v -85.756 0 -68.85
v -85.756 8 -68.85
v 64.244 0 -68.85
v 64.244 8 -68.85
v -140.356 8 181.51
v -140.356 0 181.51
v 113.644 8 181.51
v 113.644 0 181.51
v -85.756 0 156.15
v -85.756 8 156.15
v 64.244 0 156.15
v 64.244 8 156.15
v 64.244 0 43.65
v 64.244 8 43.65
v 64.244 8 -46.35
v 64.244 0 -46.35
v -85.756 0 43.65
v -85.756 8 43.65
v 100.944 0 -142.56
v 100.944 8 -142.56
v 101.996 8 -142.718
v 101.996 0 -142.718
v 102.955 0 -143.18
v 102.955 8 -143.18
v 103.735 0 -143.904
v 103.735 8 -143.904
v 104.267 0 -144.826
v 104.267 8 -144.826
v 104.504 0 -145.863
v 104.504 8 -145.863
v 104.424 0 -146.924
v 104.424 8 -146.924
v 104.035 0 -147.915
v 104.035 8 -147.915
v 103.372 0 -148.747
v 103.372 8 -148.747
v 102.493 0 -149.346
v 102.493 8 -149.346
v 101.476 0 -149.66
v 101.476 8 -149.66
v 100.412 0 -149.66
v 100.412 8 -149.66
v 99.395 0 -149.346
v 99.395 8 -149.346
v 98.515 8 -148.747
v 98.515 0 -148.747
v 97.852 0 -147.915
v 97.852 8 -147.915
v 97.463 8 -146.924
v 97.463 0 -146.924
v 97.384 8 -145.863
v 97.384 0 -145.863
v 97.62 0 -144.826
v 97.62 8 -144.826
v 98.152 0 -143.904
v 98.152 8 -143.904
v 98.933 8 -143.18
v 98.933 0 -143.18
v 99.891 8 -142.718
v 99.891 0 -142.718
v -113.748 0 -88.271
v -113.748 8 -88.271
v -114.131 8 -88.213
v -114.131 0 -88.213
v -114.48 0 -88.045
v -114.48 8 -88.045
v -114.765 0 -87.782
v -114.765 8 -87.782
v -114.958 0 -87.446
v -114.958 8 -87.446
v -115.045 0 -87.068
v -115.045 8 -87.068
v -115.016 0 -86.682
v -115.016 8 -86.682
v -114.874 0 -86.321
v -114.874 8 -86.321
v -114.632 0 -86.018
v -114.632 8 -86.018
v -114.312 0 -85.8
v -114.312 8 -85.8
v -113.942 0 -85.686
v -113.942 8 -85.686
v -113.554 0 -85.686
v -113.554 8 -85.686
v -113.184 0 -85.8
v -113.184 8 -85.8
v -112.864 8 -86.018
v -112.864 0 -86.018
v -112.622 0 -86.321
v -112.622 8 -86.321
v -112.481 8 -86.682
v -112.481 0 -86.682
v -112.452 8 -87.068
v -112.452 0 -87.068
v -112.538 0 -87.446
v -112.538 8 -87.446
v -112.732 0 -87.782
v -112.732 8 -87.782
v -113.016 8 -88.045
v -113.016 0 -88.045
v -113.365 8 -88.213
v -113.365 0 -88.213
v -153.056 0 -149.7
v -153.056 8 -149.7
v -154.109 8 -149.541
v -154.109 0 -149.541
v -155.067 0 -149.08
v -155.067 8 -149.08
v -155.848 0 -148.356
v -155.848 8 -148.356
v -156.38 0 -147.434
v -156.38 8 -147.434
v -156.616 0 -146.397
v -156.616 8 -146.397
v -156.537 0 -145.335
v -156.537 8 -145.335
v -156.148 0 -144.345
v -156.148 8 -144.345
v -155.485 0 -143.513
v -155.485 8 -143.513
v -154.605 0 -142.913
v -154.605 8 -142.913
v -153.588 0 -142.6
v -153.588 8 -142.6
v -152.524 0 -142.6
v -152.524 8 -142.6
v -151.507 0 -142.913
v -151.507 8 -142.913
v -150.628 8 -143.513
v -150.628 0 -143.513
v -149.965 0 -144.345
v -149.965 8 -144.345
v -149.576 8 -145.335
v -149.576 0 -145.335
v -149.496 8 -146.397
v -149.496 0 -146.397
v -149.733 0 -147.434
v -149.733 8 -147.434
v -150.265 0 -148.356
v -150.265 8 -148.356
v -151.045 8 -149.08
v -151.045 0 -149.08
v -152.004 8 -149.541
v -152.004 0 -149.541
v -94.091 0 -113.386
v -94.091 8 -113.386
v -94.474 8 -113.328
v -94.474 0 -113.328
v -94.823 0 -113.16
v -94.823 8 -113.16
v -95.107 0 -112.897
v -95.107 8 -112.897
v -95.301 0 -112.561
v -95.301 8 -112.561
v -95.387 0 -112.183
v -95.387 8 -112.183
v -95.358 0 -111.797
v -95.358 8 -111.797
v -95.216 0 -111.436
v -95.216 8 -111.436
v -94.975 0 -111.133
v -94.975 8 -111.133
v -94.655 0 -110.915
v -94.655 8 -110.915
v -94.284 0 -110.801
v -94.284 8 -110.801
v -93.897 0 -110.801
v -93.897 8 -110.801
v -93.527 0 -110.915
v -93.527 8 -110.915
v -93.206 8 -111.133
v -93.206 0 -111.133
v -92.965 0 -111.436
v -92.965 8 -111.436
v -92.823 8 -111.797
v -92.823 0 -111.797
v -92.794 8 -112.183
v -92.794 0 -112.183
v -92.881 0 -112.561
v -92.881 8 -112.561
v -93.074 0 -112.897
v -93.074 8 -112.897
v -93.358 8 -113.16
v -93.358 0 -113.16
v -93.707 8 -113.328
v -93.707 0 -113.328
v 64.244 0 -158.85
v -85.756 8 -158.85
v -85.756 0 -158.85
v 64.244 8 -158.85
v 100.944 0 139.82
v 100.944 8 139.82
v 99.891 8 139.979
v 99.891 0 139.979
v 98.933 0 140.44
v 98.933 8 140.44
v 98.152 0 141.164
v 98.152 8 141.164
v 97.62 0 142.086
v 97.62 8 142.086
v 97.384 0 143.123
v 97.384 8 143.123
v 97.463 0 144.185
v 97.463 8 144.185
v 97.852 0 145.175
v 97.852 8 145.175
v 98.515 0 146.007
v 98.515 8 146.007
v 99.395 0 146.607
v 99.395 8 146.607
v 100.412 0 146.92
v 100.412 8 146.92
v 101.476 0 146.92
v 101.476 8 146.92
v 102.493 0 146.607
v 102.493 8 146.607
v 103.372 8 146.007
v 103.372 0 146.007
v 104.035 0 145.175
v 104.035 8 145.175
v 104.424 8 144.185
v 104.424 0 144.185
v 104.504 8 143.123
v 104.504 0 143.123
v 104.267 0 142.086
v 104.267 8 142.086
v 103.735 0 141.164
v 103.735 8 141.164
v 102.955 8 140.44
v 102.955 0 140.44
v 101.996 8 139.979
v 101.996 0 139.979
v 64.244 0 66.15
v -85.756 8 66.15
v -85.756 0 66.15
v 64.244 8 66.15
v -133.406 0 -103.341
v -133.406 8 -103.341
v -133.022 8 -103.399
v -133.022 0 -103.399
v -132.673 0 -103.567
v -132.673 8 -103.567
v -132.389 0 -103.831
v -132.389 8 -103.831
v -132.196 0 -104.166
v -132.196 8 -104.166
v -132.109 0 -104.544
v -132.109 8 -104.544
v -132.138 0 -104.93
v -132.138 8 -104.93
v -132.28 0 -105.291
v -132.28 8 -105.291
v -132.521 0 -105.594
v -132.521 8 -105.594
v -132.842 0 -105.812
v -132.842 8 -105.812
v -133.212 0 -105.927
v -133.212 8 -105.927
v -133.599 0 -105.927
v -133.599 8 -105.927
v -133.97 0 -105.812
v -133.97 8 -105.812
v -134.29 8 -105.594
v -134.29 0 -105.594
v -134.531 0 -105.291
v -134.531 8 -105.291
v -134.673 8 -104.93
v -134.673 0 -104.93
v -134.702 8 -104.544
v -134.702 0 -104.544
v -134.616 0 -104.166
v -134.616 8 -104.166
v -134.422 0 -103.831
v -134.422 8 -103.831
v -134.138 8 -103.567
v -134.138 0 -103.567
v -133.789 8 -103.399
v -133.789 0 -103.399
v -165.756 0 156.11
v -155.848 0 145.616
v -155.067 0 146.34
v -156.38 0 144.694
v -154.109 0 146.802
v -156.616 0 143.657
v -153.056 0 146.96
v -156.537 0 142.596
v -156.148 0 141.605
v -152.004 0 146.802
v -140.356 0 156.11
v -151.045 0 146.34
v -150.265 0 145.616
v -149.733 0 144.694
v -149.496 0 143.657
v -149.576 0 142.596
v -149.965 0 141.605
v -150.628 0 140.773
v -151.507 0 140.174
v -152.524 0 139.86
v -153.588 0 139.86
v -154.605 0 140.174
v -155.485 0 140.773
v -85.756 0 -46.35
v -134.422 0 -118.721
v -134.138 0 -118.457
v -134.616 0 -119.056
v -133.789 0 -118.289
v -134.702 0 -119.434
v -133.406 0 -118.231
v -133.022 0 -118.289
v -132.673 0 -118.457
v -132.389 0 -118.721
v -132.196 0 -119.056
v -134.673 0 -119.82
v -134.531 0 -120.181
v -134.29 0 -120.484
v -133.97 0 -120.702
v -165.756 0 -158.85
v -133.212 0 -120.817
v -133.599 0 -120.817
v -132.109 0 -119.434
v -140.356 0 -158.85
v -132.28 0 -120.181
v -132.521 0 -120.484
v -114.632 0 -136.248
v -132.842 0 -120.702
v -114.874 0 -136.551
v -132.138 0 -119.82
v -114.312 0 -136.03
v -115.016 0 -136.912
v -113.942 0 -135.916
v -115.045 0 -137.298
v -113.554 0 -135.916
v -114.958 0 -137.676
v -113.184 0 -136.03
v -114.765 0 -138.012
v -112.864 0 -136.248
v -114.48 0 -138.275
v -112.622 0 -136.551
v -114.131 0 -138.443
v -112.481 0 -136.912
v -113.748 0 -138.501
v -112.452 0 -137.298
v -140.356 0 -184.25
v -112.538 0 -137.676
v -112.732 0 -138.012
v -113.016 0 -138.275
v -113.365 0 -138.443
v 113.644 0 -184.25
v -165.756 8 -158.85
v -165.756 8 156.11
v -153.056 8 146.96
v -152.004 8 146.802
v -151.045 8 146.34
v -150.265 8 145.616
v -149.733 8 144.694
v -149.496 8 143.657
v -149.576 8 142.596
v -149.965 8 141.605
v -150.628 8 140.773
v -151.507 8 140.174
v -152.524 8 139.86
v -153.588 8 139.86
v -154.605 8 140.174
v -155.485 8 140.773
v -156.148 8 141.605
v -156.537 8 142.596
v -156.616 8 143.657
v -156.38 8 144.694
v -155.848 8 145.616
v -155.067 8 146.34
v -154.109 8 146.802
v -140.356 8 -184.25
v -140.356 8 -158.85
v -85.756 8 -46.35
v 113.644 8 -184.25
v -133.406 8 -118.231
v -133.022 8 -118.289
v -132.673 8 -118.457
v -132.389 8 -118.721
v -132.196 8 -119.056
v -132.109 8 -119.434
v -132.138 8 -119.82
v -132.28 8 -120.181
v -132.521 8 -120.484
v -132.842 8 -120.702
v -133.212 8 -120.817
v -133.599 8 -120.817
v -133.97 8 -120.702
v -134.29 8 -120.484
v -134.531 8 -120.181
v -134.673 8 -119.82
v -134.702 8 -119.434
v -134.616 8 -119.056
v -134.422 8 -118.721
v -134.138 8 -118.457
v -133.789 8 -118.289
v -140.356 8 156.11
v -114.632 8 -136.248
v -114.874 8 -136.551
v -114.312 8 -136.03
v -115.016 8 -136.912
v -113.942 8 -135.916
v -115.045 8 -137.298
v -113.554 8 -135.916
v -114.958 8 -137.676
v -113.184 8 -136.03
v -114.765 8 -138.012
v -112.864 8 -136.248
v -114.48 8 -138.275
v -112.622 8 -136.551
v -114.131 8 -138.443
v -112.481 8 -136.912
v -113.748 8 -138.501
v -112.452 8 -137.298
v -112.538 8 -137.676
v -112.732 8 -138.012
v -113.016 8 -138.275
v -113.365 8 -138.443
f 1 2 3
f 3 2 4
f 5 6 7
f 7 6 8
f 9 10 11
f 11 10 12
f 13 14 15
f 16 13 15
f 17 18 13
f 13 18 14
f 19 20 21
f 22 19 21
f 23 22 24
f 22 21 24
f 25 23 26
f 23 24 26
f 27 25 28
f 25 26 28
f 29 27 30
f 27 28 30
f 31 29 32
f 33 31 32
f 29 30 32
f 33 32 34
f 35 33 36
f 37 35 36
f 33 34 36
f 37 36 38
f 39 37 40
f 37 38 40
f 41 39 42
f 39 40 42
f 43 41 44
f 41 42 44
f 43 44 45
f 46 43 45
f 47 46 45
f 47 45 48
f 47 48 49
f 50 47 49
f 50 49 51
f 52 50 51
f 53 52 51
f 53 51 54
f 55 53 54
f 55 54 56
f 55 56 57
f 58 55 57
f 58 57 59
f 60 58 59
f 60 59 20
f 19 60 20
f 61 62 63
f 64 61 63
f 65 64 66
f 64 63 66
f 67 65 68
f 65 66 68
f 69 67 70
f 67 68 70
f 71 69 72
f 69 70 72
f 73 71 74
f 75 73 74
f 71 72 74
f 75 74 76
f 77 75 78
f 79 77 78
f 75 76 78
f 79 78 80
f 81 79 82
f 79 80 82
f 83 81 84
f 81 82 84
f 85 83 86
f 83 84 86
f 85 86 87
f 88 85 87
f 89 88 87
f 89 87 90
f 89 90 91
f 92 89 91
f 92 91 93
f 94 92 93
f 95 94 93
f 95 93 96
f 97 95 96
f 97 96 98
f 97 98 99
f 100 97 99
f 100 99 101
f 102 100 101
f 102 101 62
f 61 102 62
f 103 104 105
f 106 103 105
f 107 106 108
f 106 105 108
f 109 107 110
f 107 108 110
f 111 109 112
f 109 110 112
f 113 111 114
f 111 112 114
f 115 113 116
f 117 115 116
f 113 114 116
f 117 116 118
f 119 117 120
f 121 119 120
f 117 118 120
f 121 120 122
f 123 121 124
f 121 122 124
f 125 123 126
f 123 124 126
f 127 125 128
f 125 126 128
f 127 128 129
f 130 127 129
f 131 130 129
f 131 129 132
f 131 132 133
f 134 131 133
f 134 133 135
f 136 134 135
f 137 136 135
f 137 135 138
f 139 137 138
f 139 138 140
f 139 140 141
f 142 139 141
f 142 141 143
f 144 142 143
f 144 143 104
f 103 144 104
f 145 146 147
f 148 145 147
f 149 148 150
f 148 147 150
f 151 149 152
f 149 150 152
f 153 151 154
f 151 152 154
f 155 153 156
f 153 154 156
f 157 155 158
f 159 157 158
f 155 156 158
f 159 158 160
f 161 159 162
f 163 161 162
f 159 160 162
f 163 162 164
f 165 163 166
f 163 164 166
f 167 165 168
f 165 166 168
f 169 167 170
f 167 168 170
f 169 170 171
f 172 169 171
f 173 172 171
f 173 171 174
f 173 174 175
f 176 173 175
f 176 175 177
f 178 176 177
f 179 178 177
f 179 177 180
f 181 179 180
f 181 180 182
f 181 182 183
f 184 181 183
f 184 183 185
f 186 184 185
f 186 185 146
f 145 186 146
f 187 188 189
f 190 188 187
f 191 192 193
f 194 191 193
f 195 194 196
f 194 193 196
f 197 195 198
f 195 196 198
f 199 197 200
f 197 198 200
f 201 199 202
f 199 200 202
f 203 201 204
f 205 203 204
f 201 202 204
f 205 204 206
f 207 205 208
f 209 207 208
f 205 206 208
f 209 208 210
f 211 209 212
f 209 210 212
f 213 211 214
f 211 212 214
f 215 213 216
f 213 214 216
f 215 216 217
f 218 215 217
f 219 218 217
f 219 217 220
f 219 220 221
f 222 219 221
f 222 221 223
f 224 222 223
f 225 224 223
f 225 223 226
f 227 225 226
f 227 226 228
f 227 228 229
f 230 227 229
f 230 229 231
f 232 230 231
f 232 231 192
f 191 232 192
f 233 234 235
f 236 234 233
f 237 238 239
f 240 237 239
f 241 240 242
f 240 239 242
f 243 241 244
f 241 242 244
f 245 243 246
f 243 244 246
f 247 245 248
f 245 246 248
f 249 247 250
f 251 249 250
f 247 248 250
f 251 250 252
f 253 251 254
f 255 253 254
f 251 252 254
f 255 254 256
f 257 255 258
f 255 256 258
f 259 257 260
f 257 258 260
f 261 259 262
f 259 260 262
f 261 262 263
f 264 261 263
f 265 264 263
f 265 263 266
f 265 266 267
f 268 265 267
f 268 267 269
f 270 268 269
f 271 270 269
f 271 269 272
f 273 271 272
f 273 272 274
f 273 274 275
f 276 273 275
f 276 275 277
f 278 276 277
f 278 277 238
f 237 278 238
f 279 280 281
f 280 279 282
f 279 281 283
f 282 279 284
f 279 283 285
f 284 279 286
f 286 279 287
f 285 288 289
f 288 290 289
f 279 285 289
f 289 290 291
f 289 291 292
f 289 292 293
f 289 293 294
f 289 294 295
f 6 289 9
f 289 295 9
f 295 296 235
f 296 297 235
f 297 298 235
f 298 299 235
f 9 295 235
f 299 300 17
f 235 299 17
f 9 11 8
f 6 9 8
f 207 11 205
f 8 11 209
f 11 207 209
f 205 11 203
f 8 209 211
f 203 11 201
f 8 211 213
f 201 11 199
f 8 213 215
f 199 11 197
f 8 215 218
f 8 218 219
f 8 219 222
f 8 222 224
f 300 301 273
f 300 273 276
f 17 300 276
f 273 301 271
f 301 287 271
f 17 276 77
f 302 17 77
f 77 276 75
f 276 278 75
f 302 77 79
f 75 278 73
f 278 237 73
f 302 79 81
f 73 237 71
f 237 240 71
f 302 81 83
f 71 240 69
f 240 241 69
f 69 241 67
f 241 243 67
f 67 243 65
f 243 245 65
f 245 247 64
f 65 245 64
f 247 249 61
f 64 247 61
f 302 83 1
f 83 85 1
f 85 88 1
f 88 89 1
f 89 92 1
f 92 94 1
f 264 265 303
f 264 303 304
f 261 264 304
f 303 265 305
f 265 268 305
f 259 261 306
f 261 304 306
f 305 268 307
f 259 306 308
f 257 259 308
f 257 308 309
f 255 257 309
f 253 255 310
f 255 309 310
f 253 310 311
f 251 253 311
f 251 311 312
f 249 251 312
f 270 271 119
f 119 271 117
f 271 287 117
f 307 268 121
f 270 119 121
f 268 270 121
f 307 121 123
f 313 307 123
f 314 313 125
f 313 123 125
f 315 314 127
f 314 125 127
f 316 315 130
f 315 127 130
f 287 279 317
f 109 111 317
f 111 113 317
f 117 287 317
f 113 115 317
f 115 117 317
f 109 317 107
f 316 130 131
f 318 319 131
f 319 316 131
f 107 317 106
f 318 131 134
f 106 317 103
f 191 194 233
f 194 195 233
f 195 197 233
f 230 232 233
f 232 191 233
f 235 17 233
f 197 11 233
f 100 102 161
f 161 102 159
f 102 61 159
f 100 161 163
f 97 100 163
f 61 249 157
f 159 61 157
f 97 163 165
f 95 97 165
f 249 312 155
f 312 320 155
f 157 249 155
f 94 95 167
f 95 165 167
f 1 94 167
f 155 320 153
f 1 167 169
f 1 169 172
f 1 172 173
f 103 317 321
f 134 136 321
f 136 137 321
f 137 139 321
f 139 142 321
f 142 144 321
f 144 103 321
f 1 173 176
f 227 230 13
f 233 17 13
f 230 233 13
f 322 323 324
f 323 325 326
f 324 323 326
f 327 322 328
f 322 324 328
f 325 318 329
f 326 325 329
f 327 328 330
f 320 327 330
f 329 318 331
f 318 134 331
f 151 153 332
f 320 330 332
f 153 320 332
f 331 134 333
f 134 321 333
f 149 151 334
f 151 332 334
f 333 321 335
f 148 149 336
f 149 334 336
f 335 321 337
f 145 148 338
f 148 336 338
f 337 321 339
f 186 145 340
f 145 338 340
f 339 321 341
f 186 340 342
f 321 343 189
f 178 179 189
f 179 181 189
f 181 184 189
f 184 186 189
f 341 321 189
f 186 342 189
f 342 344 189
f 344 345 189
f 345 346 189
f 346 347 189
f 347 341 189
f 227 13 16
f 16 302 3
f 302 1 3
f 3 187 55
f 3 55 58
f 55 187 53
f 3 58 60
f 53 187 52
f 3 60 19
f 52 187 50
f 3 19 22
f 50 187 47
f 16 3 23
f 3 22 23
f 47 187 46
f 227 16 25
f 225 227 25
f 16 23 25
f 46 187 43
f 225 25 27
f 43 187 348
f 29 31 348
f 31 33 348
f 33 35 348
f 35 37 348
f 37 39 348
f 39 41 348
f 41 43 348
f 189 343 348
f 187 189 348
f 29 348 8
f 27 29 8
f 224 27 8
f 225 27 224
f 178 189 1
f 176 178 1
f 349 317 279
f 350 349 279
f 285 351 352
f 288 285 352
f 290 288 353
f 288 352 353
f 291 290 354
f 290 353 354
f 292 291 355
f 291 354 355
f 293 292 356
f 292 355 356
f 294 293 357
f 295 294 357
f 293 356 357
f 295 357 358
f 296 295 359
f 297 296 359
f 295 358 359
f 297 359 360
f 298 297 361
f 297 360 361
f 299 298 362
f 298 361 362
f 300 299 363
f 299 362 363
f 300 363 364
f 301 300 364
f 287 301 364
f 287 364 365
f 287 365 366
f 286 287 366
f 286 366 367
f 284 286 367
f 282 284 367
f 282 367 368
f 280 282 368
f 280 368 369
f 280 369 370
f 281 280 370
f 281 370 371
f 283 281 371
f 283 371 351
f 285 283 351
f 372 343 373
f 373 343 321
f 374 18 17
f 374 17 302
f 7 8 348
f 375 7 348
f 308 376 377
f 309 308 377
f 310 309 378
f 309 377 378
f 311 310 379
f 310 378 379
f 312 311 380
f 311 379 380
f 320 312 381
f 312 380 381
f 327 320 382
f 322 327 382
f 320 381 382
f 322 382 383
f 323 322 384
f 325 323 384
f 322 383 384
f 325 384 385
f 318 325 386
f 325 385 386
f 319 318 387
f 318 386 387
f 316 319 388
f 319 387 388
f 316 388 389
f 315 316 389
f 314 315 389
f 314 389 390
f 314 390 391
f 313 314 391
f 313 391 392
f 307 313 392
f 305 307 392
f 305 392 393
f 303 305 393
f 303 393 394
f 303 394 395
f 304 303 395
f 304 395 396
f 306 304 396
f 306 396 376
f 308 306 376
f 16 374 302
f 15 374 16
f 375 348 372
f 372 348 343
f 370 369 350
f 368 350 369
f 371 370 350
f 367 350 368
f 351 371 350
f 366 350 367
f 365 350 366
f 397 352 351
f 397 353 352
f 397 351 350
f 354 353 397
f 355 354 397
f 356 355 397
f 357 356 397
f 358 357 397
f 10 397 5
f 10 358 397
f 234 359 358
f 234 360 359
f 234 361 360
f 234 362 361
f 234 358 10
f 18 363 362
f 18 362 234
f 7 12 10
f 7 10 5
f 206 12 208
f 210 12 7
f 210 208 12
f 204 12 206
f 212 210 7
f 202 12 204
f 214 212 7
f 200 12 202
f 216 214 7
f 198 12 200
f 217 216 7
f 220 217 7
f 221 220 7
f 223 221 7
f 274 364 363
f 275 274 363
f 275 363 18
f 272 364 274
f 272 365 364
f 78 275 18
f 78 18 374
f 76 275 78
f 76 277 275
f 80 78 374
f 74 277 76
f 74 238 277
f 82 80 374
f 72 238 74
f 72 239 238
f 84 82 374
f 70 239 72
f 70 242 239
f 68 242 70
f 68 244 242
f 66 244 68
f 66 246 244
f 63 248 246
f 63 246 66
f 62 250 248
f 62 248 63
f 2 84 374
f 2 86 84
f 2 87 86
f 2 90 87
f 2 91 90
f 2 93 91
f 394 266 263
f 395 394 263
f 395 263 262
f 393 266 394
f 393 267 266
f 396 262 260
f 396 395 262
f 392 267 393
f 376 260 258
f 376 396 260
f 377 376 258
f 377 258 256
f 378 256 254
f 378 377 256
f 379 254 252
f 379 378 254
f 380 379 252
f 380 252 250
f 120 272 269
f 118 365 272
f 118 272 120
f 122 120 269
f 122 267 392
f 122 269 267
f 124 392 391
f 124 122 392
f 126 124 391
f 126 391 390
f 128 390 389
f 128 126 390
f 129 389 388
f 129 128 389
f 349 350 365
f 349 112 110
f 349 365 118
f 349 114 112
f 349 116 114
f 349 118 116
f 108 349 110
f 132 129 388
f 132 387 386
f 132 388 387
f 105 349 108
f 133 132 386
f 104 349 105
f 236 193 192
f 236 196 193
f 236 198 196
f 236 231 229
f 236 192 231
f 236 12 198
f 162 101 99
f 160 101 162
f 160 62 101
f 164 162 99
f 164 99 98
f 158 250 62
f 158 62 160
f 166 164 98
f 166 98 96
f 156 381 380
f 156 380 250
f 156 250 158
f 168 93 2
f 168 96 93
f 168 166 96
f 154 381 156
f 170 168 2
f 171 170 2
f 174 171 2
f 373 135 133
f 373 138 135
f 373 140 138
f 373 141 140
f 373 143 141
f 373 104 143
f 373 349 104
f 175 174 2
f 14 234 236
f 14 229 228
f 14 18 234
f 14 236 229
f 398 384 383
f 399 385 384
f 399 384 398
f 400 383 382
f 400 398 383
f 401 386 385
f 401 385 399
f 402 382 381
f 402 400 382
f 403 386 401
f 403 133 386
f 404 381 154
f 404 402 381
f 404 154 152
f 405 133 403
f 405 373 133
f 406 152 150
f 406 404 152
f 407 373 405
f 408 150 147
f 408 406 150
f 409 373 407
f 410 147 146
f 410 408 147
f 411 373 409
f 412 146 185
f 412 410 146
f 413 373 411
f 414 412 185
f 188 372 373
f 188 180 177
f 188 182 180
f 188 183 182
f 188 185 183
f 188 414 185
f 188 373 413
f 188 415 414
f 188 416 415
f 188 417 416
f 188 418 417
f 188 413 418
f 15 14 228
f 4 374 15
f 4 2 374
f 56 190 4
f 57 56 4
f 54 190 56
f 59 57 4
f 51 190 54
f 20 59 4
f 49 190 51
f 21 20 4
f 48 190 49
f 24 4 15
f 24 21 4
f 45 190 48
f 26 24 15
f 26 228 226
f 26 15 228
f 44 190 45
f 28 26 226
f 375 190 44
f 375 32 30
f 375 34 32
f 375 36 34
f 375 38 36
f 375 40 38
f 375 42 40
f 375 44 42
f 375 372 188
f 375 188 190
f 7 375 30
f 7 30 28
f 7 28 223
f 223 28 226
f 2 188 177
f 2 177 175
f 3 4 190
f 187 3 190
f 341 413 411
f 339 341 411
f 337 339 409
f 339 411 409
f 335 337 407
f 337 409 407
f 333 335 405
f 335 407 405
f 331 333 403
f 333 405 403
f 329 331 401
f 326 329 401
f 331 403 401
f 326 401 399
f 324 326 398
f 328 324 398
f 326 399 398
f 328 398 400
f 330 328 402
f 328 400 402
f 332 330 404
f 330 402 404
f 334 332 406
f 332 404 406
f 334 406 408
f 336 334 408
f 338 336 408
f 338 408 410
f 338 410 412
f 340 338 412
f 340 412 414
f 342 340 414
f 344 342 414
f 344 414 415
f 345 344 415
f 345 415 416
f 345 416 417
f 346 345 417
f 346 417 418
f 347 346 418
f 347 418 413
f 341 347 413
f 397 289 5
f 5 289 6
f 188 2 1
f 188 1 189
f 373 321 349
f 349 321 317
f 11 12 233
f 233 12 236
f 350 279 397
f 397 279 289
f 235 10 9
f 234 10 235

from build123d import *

# Parameters (mm, degrees)
BOSS_EXTRUDE1_DEPTH = 8
SKETCH2_R           = 3.57
CUT_EXTRUDE1_DEPTH  = 248.966140282
SKETCH3_R           = 1.3
CUT_EXTRUDE2_DEPTH  = 248.966140282
SKETCH5_W           = 150
SKETCH5_H           = 90
CUT_EXTRUDE3_DEPTH  = 248.966140282


with BuildPart() as part:
    # Sketch1 → Boss-Extrude1 (new body)
    with BuildSketch(Plane(origin=(0, 0, 0), x_dir=(1, 0, 0), z_dir=(0, 1, 0))):
        Polygon((113.643595506, 184.24988764), (-140.356404494, 184.24988764), (-140.356404494, 158.84988764), (-165.756404494, 158.84988764), (-165.756404494, -156.11011236), (-140.356404494, -156.11011236), (-140.356404494, -181.51011236), (113.643595506, -181.51011236), align=None)
    extrude(amount=BOSS_EXTRUDE1_DEPTH)

    # Sketch2 → Cut-Extrude1 (cut, through all)
    with BuildSketch(Plane(origin=(0, 8, 0), x_dir=(1, 0, 0), z_dir=(0, 1, 0))):
        with Locations((-153.056404494, -143.39011236)):
            Circle(SKETCH2_R)
        with Locations((100.943595506, 146.12988764)):
            Circle(SKETCH2_R)
        with Locations((100.943595506, -143.39011236)):
            Circle(SKETCH2_R)
        with Locations((-153.056404494, 146.12988764)):
            Circle(SKETCH2_R)
    extrude(amount=-CUT_EXTRUDE1_DEPTH, mode=Mode.SUBTRACT)

    # Sketch3 → Cut-Extrude2 (cut, through all)
    with BuildSketch(Plane(origin=(0, 8, 0), x_dir=(1, 0, 0), z_dir=(0, 1, 0))):
        with Locations((-133.405641044, 119.531092968)):
            Circle(SKETCH3_R)
        with Locations((-133.405641044, 104.641092968)):
            Circle(SKETCH3_R)
        with Locations((-113.748141044, 86.971092968)):
            Circle(SKETCH3_R)
        with Locations((-94.090641044, 112.086092968)):
            Circle(SKETCH3_R)
        with Locations((-113.748141044, 137.201092968)):
            Circle(SKETCH3_R)
    extrude(amount=-CUT_EXTRUDE2_DEPTH, mode=Mode.SUBTRACT)

    # Sketch5 → Cut-Extrude3 (cut, through all)
    with BuildSketch(Plane(origin=(0, 8, 0), x_dir=(1, 0, 0), z_dir=(0, 1, 0))):
        with Locations((-10.756404494, 113.84988764)):
            Rectangle(SKETCH5_W, SKETCH5_H)
        with Locations((-10.756404494, 1.34988764)):
            Rectangle(SKETCH5_W, SKETCH5_H)
        with Locations((-10.756404494, -111.15011236)):
            Rectangle(SKETCH5_W, SKETCH5_H)
    extrude(amount=-CUT_EXTRUDE3_DEPTH, mode=Mode.SUBTRACT)


solid = part.part
